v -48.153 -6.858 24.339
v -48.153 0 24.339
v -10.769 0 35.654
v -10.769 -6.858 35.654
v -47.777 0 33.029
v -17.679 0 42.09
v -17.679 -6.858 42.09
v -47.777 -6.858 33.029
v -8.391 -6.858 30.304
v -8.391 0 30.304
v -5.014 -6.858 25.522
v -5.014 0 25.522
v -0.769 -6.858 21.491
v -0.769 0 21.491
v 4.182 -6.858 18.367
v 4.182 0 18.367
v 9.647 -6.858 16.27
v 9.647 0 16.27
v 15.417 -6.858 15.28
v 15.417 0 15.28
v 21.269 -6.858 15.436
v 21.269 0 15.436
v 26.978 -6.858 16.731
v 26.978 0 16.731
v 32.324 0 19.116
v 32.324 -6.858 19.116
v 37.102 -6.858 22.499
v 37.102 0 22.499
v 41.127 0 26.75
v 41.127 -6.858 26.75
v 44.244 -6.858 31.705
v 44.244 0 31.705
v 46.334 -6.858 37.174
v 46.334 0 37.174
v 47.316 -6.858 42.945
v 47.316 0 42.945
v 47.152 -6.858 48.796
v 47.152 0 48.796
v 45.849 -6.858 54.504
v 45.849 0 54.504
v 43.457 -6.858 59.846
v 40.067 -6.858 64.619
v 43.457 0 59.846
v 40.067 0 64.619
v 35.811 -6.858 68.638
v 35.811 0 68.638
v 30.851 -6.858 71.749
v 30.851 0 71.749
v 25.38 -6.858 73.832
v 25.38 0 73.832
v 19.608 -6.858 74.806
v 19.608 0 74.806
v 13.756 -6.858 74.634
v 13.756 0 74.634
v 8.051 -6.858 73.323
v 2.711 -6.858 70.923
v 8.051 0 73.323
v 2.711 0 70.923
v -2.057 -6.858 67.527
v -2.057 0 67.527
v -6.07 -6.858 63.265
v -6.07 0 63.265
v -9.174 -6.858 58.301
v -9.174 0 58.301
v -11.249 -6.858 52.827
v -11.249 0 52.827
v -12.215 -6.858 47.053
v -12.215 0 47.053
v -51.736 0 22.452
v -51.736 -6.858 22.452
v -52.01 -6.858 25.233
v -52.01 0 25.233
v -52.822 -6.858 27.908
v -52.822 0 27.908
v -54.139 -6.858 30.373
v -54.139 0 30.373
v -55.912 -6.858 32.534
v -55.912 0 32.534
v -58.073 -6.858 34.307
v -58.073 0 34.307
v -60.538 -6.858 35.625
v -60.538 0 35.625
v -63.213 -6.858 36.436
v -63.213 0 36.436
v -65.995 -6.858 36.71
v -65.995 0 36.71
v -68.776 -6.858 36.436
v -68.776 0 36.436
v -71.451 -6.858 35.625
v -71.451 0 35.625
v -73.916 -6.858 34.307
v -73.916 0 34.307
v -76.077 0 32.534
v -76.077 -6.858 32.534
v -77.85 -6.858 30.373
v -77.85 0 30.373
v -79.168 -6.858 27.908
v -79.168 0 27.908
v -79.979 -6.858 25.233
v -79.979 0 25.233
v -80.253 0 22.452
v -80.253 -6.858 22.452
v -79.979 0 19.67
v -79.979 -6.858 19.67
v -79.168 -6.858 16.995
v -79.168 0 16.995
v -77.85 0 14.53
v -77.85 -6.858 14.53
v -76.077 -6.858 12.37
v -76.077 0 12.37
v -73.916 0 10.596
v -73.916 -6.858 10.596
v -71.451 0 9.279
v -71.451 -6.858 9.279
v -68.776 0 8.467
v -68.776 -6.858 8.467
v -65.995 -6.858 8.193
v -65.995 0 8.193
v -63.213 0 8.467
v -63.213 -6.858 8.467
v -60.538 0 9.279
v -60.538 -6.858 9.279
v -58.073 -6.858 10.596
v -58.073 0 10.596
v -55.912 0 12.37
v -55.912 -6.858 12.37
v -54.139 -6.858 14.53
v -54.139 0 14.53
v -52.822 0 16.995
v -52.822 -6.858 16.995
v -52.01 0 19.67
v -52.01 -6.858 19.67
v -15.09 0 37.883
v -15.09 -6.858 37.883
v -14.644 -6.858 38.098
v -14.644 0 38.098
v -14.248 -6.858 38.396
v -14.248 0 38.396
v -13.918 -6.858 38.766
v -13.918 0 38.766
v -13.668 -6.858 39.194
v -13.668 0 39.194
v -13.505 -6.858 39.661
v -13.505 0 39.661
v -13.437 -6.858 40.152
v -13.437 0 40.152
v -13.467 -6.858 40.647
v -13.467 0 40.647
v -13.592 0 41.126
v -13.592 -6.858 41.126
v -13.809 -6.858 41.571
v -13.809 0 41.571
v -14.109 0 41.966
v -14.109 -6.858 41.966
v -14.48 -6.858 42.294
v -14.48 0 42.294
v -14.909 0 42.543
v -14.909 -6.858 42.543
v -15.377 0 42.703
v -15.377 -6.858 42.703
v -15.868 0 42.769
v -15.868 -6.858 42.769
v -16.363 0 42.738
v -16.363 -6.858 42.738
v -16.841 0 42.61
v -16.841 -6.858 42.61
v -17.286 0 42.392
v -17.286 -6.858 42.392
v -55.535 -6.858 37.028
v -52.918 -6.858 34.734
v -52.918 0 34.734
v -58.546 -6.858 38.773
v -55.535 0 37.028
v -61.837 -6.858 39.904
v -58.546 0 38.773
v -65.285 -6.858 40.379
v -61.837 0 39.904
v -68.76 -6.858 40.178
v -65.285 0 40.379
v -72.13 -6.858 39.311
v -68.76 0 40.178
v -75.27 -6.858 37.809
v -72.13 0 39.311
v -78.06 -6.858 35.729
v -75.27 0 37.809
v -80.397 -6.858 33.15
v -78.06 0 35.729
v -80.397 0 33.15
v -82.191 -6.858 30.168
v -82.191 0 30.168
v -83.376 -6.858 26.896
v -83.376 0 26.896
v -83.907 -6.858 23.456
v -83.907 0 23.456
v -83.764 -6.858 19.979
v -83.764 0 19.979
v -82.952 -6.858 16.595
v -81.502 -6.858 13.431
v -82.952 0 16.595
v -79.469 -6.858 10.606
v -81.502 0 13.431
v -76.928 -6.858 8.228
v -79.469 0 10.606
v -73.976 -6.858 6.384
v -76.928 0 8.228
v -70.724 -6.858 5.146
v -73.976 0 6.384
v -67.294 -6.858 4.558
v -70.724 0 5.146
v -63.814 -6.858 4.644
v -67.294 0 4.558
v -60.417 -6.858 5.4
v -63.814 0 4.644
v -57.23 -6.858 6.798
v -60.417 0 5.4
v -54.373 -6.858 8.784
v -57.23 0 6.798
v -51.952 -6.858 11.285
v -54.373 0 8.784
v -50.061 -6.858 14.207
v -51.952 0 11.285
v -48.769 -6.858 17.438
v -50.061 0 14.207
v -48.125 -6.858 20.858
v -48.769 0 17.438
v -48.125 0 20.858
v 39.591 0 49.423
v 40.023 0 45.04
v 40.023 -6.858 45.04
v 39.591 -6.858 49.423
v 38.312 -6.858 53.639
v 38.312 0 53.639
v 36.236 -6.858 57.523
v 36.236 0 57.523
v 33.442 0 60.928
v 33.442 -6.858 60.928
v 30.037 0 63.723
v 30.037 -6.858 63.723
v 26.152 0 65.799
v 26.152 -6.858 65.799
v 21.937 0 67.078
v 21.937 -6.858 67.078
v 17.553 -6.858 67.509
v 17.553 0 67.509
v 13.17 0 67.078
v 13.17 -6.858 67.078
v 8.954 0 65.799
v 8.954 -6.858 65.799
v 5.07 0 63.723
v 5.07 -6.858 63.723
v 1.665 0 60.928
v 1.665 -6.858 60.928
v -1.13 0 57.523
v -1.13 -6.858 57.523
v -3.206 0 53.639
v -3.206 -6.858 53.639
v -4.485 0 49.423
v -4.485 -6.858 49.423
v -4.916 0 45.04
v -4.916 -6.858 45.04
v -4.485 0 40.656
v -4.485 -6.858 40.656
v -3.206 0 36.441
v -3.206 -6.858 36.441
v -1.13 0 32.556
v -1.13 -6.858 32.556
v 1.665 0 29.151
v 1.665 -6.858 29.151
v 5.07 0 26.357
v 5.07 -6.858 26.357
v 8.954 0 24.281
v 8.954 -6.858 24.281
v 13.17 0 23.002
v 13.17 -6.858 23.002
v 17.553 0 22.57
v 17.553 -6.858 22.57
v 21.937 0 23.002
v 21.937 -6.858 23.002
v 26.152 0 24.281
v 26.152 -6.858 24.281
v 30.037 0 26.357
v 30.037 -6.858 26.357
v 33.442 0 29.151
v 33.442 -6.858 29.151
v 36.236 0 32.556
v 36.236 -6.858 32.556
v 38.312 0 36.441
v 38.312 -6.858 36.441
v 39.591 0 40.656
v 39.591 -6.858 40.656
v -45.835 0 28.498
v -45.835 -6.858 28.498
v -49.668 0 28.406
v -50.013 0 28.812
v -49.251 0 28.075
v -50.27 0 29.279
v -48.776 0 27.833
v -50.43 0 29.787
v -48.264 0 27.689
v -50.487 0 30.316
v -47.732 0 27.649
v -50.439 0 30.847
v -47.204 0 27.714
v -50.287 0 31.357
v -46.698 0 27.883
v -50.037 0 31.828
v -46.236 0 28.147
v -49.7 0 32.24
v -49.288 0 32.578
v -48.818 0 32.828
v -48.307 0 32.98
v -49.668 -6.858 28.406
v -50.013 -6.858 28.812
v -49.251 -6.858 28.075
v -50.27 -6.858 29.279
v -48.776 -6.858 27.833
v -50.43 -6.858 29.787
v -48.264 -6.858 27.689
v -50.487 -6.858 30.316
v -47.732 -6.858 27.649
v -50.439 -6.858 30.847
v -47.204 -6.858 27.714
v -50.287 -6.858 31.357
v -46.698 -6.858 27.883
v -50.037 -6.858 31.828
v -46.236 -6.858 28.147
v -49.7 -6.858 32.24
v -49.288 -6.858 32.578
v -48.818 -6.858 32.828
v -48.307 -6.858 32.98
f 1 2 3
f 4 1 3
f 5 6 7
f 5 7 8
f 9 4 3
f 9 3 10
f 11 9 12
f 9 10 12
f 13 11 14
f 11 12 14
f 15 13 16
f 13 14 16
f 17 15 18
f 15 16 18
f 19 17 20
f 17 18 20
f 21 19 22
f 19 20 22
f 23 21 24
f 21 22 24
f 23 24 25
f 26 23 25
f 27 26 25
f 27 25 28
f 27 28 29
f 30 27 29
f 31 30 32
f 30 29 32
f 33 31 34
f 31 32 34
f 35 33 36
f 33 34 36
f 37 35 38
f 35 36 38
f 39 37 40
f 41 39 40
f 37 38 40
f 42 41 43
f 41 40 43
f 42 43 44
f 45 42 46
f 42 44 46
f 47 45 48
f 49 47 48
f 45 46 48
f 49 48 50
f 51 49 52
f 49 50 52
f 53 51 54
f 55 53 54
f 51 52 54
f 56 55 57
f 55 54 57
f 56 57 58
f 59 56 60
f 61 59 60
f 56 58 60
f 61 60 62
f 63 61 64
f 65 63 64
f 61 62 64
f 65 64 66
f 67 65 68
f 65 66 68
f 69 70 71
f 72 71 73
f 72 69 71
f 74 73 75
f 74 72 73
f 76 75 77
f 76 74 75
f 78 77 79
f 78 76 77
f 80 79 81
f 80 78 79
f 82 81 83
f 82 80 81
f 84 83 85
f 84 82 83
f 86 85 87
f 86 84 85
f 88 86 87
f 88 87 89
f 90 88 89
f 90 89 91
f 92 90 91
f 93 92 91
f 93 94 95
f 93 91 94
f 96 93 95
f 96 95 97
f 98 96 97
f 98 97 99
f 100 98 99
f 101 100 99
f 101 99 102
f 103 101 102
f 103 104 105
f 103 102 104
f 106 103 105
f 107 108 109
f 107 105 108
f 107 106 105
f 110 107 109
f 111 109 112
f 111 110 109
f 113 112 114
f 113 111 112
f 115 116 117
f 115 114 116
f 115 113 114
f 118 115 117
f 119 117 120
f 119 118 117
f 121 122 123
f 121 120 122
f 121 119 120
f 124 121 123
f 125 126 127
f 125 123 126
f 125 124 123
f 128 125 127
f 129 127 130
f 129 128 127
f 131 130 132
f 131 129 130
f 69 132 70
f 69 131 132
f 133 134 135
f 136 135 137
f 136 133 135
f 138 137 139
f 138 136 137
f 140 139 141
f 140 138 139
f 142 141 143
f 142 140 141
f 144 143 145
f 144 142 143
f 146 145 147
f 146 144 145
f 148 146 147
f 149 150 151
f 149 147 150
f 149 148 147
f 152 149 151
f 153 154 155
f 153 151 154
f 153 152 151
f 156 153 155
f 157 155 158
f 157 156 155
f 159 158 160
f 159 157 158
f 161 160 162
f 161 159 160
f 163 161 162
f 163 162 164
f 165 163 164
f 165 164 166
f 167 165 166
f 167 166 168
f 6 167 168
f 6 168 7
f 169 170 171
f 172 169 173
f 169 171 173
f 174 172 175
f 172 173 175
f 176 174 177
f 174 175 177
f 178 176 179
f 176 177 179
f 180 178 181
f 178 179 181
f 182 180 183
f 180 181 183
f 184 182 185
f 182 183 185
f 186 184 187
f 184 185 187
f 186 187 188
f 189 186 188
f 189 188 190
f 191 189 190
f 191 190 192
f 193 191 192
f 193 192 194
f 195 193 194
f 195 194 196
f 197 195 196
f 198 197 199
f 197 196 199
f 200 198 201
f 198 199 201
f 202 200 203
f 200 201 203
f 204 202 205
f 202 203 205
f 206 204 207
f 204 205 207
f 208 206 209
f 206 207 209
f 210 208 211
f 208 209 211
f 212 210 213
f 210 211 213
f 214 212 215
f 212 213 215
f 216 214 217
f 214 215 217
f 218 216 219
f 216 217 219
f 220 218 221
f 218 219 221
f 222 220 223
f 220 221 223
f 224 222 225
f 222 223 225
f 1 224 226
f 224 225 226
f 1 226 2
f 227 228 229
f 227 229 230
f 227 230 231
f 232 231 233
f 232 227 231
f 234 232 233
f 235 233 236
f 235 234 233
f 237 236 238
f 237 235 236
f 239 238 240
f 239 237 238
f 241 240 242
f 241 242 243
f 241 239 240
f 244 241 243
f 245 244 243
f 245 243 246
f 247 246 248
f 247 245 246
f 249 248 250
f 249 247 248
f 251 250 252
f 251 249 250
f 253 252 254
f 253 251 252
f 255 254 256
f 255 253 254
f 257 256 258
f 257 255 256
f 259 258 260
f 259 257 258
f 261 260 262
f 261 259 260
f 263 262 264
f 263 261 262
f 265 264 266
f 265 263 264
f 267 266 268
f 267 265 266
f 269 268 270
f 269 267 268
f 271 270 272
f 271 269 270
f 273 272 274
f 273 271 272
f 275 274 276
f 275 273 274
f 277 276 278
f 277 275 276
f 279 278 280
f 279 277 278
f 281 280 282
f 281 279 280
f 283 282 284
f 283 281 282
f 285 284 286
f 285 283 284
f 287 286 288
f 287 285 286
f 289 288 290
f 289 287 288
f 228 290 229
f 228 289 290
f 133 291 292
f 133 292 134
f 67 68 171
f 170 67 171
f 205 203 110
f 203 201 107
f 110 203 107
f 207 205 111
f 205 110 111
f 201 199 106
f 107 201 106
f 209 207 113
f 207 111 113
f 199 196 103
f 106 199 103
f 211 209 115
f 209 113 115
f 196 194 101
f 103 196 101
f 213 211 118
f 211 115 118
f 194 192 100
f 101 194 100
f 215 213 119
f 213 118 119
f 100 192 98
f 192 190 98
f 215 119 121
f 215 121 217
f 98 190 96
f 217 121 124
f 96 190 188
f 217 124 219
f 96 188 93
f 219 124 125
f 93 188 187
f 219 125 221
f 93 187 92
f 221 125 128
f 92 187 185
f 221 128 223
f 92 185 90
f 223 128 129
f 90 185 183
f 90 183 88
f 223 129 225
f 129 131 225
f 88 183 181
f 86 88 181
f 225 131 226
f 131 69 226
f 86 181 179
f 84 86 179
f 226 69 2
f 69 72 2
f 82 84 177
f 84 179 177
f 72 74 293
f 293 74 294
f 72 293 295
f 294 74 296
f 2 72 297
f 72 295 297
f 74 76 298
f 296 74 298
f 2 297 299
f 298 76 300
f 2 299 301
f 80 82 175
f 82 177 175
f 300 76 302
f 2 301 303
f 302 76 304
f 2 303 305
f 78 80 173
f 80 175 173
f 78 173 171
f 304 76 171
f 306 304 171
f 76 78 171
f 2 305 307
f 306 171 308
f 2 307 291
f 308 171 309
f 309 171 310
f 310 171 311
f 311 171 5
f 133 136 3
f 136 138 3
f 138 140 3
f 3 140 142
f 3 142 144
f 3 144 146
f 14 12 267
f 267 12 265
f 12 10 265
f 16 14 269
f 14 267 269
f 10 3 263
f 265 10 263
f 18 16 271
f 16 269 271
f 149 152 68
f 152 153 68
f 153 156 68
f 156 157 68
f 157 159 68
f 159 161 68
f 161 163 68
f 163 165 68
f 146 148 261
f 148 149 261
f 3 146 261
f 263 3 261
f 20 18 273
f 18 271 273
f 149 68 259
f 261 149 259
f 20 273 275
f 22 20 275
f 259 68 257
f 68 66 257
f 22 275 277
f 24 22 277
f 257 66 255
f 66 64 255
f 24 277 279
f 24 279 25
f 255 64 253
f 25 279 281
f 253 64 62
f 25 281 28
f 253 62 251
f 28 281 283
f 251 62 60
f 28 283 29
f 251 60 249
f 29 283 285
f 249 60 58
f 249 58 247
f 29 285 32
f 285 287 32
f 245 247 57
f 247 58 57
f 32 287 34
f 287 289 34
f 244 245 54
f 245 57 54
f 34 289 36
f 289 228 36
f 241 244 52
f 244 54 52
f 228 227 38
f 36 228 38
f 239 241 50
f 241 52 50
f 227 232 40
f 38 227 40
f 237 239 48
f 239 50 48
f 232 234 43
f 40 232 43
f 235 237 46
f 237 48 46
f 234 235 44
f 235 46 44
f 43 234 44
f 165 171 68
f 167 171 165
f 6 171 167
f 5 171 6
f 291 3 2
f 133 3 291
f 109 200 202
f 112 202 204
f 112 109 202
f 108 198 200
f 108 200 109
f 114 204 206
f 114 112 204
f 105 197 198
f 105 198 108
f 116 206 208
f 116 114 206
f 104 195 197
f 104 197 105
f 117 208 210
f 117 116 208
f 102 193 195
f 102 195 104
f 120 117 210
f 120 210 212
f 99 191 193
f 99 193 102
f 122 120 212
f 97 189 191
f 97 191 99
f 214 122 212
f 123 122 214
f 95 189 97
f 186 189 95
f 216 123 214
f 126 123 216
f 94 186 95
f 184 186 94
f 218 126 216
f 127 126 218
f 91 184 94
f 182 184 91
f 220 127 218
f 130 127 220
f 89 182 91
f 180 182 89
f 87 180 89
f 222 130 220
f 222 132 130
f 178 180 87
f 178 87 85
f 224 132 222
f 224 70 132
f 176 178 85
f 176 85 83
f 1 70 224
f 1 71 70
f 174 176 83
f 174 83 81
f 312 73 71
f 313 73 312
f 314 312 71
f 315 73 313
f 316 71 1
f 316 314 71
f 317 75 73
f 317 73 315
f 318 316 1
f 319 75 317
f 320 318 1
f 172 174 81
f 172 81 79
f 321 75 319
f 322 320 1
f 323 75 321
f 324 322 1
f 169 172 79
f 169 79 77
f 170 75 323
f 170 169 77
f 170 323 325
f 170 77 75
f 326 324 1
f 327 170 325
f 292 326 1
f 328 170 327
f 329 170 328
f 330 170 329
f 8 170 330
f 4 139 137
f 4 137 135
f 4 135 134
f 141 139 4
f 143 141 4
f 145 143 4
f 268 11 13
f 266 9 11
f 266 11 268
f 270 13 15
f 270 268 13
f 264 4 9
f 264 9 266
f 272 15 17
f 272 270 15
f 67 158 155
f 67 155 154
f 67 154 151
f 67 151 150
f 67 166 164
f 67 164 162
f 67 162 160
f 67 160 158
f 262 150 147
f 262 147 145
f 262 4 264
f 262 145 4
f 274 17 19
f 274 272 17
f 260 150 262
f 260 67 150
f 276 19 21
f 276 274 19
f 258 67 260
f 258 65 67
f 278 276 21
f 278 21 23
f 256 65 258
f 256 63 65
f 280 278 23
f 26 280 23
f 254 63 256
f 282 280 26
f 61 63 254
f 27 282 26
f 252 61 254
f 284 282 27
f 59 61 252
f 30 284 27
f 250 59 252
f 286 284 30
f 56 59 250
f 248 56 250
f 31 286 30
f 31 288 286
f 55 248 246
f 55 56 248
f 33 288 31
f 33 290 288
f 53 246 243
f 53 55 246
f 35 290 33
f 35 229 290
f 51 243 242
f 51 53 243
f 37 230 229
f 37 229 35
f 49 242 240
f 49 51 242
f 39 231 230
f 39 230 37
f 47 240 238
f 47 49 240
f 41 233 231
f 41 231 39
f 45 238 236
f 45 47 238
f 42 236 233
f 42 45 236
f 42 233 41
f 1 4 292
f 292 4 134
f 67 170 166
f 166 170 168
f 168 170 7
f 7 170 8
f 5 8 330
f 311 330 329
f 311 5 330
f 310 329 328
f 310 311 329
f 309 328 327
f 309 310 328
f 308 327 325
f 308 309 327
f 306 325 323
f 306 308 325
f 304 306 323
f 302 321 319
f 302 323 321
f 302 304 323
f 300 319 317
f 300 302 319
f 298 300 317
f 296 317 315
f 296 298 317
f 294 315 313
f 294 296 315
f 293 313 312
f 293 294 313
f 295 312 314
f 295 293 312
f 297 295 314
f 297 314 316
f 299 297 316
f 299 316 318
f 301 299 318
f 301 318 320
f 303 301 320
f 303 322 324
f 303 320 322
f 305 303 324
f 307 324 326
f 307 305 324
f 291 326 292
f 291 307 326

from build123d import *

# Parameters (mm, degrees)
F0_R        = 14.25831
F0_R_2      = 22.469568
F1_DEPTH    = 6.858
F1_FACE_R   = 14.25831
F1_FACE_R_2 = 22.469568
F3_DEPTH    = 51.562


with BuildPart() as f1:
    # F0 (on Front) → F1 (new body)
    with BuildSketch(Plane.XZ):
        with BuildLine():
            Line((-12.215332, 47.053497), (-52.917511, 34.734328))
            ThreePointArc((-52.917511, 34.734328), (-82.304308, 14.977358), (-48.153338, 24.338603))
            Line((-48.153338, 24.338603), (-10.768532, 35.653716))
            ThreePointArc((-10.768532, 35.653716), (47.15239, 48.796433), (-12.215332, 47.053497))
        make_face()
        with Locations((-65.994643, 22.451784)):
            Circle(F0_R, mode=Mode.SUBTRACT)
        with Locations((17.553231, 45.039865)):
            Circle(F0_R_2, mode=Mode.SUBTRACT)
    extrude(amount=F1_DEPTH)

    # F2 (on Front) + F1_face (on face) → F3 (cut)
    with BuildSketch(Plane.XZ):
        with BuildLine():
            Line((-17.678859, 42.090312), (-47.776841, 33.02855))
            ThreePointArc((-47.776841, 33.02855), (-50.269829, 29.278588), (-45.835037, 28.497672))
            Line((-45.835037, 28.497672), (-15.089784, 37.883066))
            ThreePointArc((-15.089784, 37.883066), (-13.809394, 41.571259), (-17.678859, 42.090312))
        make_face()
    with BuildSketch(Plane(origin=(-8.49041, -6.858, 38.801754), x_dir=(1, 0, 0), z_dir=(0, -1, 0))):
        with BuildLine():
            Line((-39.662928, -14.46315), (-2.278122, -3.148038))
            ThreePointArc((-2.278122, -3.148038), (55.6428, 9.99468), (-3.724922, 8.251743))
            Line((-3.724922, 8.251743), (-44.427102, -4.067426))
            ThreePointArc((-44.427102, -4.067426), (-73.813899, -23.824395), (-39.662928, -14.46315))
        make_face()
        with Locations((-57.504233, -16.349969)):
            Circle(F1_FACE_R, mode=Mode.SUBTRACT)
        with Locations((26.043641, 6.238111)):
            Circle(F1_FACE_R_2, mode=Mode.SUBTRACT)
    extrude(amount=F3_DEPTH, mode=Mode.SUBTRACT)


solid = f1.part
